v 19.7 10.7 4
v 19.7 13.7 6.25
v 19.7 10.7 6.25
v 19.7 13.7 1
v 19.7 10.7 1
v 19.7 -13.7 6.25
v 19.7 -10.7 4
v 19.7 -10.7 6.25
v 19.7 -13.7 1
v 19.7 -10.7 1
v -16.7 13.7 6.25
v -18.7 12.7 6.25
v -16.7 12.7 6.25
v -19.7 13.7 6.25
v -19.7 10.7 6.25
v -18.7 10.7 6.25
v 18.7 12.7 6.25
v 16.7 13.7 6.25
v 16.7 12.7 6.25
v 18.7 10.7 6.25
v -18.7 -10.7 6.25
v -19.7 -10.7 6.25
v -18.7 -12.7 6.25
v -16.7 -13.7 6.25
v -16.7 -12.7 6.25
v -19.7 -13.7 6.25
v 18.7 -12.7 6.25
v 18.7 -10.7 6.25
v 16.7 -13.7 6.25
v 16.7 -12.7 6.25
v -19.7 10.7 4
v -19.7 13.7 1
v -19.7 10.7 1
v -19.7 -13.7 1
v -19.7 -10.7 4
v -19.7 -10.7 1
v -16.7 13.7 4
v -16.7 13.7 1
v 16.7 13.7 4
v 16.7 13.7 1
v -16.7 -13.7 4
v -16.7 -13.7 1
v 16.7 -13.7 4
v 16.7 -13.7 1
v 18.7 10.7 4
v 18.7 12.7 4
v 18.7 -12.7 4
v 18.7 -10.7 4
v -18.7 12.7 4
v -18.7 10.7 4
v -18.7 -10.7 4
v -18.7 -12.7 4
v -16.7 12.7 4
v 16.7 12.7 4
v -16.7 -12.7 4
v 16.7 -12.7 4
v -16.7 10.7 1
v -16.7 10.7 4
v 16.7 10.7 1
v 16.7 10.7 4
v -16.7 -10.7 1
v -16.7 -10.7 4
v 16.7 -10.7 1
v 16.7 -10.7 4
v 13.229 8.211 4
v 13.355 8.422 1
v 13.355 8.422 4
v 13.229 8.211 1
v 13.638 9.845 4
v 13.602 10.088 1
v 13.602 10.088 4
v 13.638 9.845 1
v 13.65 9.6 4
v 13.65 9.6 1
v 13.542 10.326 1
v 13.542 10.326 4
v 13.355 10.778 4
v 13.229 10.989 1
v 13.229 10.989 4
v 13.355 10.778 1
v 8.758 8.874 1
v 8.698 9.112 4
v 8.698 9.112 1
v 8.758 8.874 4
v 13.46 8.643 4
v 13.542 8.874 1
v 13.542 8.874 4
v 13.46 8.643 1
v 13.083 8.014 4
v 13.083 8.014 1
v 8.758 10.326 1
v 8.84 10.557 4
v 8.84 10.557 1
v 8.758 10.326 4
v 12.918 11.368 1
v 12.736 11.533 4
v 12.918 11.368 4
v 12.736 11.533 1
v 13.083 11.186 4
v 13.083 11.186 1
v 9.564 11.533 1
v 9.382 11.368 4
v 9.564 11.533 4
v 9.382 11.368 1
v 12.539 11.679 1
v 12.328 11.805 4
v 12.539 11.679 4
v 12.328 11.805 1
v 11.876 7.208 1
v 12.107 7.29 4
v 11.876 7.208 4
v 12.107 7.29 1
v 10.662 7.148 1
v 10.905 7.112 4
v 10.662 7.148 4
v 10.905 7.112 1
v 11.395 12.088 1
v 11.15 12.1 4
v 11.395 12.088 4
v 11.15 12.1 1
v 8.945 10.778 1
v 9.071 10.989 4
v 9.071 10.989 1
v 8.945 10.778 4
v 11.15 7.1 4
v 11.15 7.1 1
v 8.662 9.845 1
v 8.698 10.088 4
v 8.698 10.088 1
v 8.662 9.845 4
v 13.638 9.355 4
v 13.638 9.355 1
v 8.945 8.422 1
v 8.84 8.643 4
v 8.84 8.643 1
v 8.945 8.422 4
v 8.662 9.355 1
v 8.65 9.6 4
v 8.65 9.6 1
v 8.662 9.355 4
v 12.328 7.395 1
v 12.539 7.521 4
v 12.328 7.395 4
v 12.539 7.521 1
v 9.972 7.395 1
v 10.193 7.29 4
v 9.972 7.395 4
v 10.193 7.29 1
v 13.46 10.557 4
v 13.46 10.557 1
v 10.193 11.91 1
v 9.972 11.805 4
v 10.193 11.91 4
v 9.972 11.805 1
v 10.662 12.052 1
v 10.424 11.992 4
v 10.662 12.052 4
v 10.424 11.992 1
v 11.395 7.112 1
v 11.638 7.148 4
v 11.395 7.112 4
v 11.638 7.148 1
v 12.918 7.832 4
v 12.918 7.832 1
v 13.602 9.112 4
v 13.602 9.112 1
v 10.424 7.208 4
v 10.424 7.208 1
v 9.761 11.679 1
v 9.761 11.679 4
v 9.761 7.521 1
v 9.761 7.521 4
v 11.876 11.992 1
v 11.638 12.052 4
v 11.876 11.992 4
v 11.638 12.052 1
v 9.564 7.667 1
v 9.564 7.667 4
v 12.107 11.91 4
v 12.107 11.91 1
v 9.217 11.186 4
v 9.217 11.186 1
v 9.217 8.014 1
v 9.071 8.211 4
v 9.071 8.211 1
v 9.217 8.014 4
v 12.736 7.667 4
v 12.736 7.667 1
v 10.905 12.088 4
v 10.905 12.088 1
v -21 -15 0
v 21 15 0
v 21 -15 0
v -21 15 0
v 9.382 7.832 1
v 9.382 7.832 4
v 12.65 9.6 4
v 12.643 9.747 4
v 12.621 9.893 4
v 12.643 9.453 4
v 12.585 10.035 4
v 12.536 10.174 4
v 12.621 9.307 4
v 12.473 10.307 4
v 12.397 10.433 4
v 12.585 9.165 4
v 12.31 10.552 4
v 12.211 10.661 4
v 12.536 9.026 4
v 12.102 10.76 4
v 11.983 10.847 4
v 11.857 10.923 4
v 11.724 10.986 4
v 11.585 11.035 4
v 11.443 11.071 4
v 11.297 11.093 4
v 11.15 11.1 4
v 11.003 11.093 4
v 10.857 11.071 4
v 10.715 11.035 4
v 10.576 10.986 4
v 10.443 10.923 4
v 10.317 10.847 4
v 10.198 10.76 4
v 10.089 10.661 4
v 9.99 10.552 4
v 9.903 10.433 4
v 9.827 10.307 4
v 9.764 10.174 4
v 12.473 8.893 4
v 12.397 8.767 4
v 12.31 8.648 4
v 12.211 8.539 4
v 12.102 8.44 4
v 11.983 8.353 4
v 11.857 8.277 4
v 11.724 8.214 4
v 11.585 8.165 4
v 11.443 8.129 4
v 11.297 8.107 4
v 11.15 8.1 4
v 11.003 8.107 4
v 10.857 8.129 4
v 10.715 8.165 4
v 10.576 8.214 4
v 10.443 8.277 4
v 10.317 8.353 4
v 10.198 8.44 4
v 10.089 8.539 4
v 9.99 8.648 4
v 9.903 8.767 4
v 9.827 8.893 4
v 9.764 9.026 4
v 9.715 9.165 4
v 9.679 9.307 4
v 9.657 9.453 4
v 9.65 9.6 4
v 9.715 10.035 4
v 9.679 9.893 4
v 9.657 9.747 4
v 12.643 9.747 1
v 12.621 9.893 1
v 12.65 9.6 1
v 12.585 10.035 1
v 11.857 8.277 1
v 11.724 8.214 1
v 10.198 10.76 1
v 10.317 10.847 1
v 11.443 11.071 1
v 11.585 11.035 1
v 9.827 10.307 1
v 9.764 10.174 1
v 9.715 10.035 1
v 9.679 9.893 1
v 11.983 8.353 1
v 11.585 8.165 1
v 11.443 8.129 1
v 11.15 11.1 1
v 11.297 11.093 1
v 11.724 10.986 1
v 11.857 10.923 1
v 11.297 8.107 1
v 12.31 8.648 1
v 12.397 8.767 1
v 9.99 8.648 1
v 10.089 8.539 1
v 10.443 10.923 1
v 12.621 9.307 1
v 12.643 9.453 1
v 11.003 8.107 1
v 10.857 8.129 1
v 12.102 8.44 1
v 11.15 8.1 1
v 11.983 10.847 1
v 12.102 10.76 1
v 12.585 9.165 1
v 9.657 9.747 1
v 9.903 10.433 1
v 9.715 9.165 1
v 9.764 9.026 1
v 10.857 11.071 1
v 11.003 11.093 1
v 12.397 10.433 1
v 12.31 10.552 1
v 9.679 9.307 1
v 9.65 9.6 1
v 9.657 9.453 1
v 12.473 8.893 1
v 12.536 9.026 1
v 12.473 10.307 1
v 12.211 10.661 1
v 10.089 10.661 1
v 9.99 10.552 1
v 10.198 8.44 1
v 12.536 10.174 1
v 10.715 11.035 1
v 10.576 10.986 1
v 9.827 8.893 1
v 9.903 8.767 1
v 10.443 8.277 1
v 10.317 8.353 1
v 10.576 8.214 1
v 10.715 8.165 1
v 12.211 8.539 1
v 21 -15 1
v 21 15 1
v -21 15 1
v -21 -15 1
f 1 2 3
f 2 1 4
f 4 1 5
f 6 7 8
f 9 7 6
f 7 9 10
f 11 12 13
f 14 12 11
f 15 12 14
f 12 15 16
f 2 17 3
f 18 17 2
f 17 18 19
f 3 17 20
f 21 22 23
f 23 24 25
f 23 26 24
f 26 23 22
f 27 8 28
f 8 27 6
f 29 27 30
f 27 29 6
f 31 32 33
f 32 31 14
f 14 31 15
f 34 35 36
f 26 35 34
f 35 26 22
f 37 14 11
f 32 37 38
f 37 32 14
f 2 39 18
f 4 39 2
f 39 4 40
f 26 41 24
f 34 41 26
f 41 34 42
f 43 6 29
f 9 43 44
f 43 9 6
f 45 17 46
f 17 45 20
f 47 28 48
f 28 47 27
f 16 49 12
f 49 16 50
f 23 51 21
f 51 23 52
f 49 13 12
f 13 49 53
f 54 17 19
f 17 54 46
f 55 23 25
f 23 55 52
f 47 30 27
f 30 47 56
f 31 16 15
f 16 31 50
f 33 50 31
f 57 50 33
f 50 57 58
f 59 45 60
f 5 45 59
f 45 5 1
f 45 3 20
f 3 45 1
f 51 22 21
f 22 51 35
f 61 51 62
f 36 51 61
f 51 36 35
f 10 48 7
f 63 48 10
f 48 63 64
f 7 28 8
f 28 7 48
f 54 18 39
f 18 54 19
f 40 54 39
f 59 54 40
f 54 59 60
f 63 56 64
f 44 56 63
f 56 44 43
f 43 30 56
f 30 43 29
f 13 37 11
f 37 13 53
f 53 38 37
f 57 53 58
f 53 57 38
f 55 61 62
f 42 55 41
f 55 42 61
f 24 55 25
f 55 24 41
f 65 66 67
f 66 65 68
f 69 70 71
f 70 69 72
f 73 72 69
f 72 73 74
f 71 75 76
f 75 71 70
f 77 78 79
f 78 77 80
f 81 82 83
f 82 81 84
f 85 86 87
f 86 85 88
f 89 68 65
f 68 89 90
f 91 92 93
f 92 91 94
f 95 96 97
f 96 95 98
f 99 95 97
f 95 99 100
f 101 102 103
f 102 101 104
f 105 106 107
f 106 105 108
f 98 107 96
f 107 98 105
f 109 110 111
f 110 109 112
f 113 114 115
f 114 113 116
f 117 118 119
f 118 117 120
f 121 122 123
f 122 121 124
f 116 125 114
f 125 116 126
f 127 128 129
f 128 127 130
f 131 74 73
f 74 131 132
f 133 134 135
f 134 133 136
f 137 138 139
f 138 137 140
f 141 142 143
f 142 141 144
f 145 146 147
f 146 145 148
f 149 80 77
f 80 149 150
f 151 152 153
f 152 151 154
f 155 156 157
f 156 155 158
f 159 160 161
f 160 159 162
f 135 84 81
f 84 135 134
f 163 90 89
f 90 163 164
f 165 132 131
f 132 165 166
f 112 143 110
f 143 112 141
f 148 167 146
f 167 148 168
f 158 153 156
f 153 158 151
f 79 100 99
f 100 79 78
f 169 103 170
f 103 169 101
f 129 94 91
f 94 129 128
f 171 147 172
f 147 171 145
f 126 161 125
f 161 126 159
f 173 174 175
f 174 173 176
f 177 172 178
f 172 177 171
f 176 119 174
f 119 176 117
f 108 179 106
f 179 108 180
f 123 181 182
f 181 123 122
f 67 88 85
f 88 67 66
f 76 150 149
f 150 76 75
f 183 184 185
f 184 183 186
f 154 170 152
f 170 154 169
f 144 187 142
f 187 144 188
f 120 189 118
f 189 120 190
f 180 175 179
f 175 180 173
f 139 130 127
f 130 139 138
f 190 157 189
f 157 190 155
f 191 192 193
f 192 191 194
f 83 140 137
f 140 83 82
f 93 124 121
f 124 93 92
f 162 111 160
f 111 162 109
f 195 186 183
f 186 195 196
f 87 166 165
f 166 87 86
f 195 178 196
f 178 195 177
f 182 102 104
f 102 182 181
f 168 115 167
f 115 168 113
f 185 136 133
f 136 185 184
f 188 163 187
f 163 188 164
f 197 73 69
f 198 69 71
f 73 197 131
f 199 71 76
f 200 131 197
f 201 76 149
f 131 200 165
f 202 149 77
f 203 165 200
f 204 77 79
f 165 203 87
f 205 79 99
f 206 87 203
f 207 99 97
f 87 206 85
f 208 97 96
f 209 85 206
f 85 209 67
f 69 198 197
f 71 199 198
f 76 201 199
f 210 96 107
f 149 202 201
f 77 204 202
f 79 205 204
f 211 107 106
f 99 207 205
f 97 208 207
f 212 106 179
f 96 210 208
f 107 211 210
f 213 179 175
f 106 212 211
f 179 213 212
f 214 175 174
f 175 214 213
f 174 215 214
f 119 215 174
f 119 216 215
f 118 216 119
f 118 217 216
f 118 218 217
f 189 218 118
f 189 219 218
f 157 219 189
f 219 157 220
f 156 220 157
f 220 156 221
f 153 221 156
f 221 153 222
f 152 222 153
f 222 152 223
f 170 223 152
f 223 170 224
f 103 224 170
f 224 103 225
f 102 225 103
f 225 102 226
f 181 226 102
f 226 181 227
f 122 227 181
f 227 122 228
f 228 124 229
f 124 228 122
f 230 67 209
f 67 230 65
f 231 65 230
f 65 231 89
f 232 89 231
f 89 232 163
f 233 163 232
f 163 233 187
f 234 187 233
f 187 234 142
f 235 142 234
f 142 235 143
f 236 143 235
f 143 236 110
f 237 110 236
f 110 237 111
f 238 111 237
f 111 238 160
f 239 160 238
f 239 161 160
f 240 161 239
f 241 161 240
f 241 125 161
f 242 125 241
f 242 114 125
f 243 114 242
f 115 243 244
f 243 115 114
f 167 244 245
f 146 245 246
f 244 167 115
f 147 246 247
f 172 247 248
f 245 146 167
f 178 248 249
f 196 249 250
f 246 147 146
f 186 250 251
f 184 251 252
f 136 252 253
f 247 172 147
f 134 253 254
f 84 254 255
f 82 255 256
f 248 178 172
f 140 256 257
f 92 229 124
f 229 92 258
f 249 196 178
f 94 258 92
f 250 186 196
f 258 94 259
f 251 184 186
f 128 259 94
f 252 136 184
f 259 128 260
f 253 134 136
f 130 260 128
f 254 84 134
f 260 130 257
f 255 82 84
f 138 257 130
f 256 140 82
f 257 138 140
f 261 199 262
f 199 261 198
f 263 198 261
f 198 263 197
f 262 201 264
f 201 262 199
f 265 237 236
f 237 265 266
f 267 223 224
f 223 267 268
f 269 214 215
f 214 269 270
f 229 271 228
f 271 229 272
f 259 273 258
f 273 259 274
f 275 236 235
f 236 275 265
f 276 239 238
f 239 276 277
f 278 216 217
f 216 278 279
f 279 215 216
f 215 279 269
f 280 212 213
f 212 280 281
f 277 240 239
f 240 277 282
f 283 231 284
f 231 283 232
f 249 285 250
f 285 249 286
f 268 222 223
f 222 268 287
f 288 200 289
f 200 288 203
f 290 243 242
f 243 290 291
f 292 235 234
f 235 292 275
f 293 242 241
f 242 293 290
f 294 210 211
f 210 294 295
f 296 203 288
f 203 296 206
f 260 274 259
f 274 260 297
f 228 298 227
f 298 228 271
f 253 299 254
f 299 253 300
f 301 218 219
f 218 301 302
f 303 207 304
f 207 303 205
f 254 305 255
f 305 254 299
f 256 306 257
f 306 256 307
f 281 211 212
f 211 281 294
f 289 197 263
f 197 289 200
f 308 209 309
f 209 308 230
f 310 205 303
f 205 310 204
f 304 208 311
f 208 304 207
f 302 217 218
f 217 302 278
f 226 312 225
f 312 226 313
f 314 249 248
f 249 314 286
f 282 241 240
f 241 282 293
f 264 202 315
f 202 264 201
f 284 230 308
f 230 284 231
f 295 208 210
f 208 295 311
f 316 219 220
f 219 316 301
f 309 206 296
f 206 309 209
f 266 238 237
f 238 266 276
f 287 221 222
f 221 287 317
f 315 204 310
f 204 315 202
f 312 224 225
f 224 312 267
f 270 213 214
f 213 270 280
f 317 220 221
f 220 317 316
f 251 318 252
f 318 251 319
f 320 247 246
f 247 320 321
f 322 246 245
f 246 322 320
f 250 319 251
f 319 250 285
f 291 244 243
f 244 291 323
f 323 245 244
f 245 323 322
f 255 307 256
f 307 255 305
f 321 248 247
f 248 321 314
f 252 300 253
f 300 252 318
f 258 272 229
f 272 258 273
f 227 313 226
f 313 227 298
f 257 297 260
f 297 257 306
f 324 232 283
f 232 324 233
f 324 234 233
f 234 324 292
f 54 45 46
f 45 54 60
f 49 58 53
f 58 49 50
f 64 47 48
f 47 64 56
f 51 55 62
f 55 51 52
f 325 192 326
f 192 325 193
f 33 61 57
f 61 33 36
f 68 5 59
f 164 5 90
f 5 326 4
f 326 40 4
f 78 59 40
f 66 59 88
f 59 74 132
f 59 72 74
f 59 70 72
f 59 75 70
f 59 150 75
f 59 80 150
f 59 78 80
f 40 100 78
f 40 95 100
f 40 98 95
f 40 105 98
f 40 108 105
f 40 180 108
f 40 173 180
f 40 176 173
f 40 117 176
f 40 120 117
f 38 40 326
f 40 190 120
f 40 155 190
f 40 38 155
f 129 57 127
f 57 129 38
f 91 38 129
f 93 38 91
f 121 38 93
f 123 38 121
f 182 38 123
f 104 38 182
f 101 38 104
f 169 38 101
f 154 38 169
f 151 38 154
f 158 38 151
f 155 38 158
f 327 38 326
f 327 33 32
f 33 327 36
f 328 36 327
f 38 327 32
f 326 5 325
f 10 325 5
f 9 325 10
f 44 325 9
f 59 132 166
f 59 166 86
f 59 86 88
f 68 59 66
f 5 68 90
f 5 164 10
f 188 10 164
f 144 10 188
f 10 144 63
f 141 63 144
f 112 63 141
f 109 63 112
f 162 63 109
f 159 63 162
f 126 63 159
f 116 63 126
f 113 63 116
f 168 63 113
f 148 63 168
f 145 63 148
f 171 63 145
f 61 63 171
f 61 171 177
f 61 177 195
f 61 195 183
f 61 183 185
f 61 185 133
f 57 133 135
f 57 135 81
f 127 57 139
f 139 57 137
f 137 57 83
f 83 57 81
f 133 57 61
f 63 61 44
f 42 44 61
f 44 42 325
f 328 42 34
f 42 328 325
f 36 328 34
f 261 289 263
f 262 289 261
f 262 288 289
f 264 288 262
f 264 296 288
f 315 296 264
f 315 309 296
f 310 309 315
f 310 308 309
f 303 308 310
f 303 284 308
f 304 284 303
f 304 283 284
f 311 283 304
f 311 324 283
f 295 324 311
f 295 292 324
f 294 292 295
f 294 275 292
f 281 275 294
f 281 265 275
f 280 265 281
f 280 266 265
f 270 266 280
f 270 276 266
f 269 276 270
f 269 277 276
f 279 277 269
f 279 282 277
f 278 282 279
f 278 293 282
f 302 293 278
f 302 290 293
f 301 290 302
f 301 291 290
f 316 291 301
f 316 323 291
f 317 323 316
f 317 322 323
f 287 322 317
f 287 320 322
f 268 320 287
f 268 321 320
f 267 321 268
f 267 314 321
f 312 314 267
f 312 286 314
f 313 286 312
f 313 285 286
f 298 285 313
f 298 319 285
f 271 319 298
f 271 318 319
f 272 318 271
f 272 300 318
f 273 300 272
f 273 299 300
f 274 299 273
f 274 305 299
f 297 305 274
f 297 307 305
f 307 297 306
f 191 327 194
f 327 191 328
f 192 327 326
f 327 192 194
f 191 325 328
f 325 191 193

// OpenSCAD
width = 37.4;
length = 25.4;

// base
translate([0,0,0.5]) {
    cube([42,30,1], center=true);
}

// corner
translate([0,0,3.5]) {
    difference(){
        cube([width+2,length+2,5.5], center=true);
        cube([width,length,5.51],center=true);
        cube([width+2.1,length-4,5.51],center=true);
        cube([width-4,length+2.1,5.51],center=true);
    }
}

// screw hole
translate([37.2/2-5.7-3.5/2,25.3/2-1.3-3.5/2,2]){
    difference(){
        cylinder(d=5.0,h=4,$fn=64,center=true);
        cylinder(d=3.0,h=4.1,$fn=64,center=true);
    }
}

// support for corner
for (y = [length/2-0.5, -length/2+0.5]) {
    for (x = [width/2-0.5, -width/2+0.5]) {
        translate([x,y,2]){
            cube([3,3,4], center=true);
        }        
    }
}
